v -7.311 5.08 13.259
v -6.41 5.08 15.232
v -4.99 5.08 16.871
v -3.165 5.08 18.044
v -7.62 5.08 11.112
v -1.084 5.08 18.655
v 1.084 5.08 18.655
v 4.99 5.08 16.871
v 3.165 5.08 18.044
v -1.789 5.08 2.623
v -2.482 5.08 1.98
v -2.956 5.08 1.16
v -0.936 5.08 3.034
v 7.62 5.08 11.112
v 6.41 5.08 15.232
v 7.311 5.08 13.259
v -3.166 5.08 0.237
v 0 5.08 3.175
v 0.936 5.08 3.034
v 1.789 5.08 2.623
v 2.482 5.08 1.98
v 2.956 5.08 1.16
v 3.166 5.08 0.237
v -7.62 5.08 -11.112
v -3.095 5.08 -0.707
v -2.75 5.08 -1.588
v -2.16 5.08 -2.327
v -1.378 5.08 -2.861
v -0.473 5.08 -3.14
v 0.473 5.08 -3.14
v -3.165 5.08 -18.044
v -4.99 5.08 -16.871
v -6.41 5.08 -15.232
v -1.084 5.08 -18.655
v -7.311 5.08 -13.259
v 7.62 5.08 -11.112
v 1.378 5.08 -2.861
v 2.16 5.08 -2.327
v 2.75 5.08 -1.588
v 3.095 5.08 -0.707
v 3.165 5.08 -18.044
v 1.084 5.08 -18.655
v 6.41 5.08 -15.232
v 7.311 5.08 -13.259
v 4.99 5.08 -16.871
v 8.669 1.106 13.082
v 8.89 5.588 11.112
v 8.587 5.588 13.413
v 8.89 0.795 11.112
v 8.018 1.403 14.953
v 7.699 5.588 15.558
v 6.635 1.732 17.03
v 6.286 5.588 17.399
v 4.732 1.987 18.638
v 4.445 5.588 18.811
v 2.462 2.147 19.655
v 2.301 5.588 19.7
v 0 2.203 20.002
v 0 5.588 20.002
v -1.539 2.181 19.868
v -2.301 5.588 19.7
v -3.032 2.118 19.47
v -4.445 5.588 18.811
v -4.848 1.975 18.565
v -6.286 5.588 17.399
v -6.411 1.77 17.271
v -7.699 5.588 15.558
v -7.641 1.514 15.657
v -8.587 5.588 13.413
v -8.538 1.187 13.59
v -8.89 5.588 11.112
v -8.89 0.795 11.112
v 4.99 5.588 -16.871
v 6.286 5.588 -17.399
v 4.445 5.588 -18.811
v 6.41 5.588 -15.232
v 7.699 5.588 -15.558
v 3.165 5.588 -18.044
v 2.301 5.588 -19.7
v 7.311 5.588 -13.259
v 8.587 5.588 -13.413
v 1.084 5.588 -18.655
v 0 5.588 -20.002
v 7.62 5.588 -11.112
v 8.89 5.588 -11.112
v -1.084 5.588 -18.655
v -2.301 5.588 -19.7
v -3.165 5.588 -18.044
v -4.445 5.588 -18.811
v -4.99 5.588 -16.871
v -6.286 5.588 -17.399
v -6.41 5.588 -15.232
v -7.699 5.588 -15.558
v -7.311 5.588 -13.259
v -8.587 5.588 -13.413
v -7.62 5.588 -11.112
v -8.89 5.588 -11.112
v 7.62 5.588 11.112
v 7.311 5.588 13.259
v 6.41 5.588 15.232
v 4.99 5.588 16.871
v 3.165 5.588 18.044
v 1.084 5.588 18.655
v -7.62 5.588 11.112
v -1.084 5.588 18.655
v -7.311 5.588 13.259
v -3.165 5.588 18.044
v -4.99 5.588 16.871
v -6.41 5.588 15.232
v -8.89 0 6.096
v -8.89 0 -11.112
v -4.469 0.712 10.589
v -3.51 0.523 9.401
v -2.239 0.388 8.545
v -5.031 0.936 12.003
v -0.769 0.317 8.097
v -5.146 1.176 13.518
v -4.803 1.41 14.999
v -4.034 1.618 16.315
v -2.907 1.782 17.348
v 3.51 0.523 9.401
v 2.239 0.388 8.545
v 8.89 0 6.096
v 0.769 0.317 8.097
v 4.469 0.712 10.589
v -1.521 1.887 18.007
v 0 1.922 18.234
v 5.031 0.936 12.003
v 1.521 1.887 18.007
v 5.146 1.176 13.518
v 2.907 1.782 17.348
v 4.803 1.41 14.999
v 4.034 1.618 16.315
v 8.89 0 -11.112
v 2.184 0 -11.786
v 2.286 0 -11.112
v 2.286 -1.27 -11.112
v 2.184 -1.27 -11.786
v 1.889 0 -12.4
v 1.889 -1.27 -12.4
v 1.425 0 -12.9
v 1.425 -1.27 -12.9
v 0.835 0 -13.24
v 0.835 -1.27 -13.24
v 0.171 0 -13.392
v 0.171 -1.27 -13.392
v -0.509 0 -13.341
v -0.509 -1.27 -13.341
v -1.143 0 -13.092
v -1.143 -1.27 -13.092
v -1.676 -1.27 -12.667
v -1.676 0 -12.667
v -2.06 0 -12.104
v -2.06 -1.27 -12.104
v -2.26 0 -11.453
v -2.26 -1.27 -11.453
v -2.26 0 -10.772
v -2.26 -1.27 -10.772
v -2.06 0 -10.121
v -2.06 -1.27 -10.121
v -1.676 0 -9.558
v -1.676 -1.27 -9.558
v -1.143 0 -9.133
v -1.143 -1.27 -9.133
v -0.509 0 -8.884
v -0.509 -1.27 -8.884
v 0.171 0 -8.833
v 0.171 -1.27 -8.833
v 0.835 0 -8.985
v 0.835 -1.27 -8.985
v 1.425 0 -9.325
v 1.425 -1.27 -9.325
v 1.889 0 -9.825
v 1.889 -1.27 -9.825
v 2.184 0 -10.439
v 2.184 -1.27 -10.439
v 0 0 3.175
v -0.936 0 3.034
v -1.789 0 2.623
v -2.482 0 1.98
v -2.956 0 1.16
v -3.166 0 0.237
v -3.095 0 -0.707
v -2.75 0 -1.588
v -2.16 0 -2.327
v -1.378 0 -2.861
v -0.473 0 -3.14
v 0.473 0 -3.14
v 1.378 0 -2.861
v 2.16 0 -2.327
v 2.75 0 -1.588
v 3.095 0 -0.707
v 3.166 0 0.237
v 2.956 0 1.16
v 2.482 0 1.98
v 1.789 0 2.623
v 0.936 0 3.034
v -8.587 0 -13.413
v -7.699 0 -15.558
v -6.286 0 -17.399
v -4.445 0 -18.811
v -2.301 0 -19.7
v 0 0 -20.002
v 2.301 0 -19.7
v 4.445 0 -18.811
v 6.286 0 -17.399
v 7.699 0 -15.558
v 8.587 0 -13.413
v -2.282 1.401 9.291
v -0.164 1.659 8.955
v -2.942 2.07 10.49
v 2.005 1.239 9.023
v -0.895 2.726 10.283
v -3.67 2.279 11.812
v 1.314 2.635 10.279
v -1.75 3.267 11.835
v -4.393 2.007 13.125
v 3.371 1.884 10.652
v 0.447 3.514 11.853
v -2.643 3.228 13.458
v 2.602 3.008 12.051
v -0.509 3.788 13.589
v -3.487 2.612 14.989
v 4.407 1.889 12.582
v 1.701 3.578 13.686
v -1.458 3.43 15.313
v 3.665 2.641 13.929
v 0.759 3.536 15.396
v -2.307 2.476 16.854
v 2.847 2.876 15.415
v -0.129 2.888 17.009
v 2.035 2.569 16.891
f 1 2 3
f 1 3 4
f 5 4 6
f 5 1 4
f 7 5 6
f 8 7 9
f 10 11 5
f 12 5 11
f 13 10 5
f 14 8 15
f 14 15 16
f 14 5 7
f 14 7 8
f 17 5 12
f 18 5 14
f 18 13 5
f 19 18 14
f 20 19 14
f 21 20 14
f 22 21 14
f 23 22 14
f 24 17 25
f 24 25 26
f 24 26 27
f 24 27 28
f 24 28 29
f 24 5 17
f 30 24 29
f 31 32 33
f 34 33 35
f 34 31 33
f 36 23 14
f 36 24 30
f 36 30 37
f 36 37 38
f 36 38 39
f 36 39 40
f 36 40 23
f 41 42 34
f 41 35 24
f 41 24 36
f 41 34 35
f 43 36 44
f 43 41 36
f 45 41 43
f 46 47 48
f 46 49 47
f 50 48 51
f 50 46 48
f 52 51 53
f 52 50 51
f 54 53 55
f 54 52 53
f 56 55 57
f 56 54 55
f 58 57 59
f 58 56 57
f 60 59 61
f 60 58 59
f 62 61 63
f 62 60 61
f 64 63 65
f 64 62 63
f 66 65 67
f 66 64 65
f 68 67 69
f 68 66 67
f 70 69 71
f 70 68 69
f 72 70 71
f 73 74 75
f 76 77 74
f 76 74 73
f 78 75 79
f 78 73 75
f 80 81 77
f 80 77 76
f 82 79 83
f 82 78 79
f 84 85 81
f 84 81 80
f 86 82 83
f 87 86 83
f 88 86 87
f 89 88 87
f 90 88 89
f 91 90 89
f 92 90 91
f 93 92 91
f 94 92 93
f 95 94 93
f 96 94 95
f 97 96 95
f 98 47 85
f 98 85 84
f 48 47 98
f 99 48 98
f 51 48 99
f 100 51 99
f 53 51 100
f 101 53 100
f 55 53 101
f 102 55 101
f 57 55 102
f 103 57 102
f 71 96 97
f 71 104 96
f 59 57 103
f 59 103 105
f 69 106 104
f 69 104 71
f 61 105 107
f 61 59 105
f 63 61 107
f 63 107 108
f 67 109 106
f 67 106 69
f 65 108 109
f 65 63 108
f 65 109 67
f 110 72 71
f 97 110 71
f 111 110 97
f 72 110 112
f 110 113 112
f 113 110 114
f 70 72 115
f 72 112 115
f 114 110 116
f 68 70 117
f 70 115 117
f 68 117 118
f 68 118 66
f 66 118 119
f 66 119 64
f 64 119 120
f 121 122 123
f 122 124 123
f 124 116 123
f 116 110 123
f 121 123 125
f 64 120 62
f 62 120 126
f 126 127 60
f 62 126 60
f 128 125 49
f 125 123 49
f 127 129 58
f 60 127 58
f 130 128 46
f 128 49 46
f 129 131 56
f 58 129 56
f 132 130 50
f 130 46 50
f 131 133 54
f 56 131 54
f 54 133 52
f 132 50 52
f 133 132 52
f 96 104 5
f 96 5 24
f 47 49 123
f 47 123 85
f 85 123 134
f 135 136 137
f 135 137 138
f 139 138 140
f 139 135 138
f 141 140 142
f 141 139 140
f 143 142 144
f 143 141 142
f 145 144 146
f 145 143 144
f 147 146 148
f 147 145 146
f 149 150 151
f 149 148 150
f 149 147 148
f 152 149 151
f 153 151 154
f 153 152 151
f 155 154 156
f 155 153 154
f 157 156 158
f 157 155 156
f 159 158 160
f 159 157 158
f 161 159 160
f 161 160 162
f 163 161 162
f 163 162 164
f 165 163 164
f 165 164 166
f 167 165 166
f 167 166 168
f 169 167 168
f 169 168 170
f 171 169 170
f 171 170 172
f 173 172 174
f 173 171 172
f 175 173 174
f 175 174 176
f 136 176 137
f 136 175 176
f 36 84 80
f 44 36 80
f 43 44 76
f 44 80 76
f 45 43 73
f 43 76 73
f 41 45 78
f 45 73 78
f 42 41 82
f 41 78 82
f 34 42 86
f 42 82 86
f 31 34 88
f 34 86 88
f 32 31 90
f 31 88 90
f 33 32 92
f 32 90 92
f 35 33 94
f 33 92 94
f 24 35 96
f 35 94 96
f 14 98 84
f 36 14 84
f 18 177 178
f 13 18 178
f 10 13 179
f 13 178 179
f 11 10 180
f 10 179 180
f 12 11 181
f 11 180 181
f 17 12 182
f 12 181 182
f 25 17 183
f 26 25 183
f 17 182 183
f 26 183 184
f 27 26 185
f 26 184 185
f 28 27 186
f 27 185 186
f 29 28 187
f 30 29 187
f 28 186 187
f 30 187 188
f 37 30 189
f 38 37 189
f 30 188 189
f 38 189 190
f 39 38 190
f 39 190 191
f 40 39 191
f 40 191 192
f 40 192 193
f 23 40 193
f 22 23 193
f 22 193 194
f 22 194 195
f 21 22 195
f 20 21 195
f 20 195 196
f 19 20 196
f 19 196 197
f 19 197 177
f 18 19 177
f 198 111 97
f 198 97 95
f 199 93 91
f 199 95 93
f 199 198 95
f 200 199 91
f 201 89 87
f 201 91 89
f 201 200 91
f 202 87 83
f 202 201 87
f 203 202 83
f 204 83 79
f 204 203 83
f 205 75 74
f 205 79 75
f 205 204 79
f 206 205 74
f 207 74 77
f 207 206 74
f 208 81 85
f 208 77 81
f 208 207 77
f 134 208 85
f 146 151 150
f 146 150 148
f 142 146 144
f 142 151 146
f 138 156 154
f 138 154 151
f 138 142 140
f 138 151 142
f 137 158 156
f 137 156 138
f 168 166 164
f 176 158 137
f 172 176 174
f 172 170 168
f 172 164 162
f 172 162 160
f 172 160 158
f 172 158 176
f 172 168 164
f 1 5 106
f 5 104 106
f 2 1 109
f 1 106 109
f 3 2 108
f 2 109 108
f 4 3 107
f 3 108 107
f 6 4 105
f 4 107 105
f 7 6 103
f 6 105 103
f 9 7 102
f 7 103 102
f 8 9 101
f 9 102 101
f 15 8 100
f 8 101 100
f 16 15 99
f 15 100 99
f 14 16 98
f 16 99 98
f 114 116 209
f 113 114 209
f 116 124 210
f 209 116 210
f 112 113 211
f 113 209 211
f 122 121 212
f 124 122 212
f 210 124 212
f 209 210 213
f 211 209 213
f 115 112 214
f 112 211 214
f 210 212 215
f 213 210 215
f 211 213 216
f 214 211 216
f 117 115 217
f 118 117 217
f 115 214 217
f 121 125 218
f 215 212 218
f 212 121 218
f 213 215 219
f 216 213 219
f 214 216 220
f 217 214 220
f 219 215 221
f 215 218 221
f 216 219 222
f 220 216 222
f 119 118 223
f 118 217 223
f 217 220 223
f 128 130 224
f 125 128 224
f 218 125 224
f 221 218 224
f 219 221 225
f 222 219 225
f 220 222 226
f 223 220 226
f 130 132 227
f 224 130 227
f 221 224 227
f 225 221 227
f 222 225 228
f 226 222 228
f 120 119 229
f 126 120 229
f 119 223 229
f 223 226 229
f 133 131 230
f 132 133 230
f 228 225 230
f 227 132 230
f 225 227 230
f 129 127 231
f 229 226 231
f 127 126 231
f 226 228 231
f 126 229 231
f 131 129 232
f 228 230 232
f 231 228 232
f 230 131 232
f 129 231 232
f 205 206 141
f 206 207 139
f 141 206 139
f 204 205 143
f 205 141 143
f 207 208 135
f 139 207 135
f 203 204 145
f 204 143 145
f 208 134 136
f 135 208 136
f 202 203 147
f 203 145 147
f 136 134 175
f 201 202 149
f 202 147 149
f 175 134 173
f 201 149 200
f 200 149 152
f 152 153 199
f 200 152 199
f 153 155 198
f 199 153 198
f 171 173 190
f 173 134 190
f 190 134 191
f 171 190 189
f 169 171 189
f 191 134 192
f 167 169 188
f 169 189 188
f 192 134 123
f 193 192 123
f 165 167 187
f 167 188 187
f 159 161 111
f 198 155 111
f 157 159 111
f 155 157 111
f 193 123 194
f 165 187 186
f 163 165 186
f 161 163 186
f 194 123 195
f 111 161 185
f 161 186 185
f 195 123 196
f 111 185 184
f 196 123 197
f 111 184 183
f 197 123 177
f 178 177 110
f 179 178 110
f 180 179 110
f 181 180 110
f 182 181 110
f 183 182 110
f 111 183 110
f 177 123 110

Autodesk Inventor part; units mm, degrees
ref_plane "YZ Plane" through (0, 0, 0) normal (1, 0, 0) x (0, 1, 0)
ref_plane "XZ Plane" through (0, 0, 0) normal (0, 1, 0) x (-1, 0, 0)
sketch "Sketch1" plane through (0, 0, 0) normal (0, 1, 0) x (-1, 0, 0)
  arc A0 (8.89, 11.1125) -> (-8.89, 11.1125) centre (0, 11.1125) ccw
  line L0 (-8.89, 0) -> (8.89, 0)
  arc A1 (-8.89, -11.1125) -> (8.89, -11.1125) centre (0, -11.1125) ccw
  line L1 (8.89, 11.1125) -> (8.89, -11.1125)
  line L2 (-8.89, 11.1125) -> (-8.89, -11.1125)
  point P0 (0, 0)
extrude "Extrusion1" add sketch "Sketch1" along normal blind 5.588
sketch "Sketch2" plane through (0, 5.588, 0) normal (0, 1, 0) x (1, 0, 0)
  arc A0 (-7.62, -11.1125) -> (7.62, -11.1125) centre (0, -11.1125) ccw
  arc A1 (7.62, 11.1125) -> (-7.62, 11.1125) centre (0, 11.1125) ccw
  line L0 (-7.62, -11.1125) -> (-7.62, 11.1125)
  line L1 (7.62, -11.1125) -> (7.62, 11.1125)
  line L2 (8.89, -11.1125) -> (8.89, 11.1125) projected
  line L3 (-8.89, 11.1125) -> (-8.89, -11.1125) projected
  arc A2 (-8.89, -11.1125) -> (8.89, -11.1125) centre (0, -11.1125) ccw projected
  point P0 (0, 0)
  dimension "d32" = 1.27
  dimension "d33" = 1.27
  dimension "d34" = 1.27
  dimension "d36" = 22.225
  dimension "d37" = 22.225
  dimension "d38" = 22.225
extrude "Extrusion2" cut sketch "Sketch2" against normal blind 0.508
sketch "Sketch3" plane through (0, 5.08, 0) normal (0, 1, 0) x (1, 0, 0)
  circle A0 centre (0, 0) radius 3.175
  point P0 (0, 0)
  dimension "d10" = 6.35
hole "Hole1" at (0, 5.08, 0) direction (0, -1, 0) diameter 6.35 end through all
thread "Thread1" size "1/4-20 UNC" class "1B" standard "ANSI Unified Screw Threads" full length
sketch "Sketch4" plane through (8.89, 0, 11.1125) normal (1, 0, 0) x (0, 0, -1)
  line L0 (5.0165, 0) -> (-12.6241, 2.794)
  line L1 (-12.6241, 2.794) -> (-8.89, 2.2026)
  line L2 (-8.89, 0) -> (-8.89, 5.588) projected
  line L3 (-8.89, 2.2026) -> (-8.89, 0)
  line L4 (5.0165, 0) -> (-8.89, 0)
  line L5 (-8.89, 2.2026) -> (5.0165, 0)
  point P0 (11.1125, 0)
  dimension "d29" = 9
  dimension "d30" = 6.096
extrude "Extrusion3" cut sketch "Sketch4" against normal through all
ref_plane "Work Plane1" through (0, -2.54, 0) normal (0, -1, 0) x (1, 0, 0)
sketch "Sketch5" plane through (0, -2.54, 0) normal (0, -1, 0) x (1, 0, 0)
  circle A0 centre (0, 13.716) radius 6.35
  line L0 (-5.5625, 10.6531) -> (5.5625, 16.7789)
  point P0 (0, 0)
  dimension "d23" = 12.7
  dimension "d31" = 13.716
revolve "Revolution1" cut sketch "Sketch5" angle 360 about axis through (-5.5625, -2.54, 10.6531) along (0.8759844, 0, 0.4823395) picked at (2.4961, 12.478) contours A0 L0
sketch "Sketch6" plane through (0, 0, 0) normal (0, -1, 0) x (1, 0, 0)
  circle A0 centre (0, -11.1125) radius 2.286
  point P0 (0, 0)
  dimension "d25" = 4.572
  dimension "d26" = 11.1125
extrude "Extrusion4" add sketch "Sketch6" along normal blind 1.27
properties part number "Lopez_LeftClamp" material "Polypropylene"
